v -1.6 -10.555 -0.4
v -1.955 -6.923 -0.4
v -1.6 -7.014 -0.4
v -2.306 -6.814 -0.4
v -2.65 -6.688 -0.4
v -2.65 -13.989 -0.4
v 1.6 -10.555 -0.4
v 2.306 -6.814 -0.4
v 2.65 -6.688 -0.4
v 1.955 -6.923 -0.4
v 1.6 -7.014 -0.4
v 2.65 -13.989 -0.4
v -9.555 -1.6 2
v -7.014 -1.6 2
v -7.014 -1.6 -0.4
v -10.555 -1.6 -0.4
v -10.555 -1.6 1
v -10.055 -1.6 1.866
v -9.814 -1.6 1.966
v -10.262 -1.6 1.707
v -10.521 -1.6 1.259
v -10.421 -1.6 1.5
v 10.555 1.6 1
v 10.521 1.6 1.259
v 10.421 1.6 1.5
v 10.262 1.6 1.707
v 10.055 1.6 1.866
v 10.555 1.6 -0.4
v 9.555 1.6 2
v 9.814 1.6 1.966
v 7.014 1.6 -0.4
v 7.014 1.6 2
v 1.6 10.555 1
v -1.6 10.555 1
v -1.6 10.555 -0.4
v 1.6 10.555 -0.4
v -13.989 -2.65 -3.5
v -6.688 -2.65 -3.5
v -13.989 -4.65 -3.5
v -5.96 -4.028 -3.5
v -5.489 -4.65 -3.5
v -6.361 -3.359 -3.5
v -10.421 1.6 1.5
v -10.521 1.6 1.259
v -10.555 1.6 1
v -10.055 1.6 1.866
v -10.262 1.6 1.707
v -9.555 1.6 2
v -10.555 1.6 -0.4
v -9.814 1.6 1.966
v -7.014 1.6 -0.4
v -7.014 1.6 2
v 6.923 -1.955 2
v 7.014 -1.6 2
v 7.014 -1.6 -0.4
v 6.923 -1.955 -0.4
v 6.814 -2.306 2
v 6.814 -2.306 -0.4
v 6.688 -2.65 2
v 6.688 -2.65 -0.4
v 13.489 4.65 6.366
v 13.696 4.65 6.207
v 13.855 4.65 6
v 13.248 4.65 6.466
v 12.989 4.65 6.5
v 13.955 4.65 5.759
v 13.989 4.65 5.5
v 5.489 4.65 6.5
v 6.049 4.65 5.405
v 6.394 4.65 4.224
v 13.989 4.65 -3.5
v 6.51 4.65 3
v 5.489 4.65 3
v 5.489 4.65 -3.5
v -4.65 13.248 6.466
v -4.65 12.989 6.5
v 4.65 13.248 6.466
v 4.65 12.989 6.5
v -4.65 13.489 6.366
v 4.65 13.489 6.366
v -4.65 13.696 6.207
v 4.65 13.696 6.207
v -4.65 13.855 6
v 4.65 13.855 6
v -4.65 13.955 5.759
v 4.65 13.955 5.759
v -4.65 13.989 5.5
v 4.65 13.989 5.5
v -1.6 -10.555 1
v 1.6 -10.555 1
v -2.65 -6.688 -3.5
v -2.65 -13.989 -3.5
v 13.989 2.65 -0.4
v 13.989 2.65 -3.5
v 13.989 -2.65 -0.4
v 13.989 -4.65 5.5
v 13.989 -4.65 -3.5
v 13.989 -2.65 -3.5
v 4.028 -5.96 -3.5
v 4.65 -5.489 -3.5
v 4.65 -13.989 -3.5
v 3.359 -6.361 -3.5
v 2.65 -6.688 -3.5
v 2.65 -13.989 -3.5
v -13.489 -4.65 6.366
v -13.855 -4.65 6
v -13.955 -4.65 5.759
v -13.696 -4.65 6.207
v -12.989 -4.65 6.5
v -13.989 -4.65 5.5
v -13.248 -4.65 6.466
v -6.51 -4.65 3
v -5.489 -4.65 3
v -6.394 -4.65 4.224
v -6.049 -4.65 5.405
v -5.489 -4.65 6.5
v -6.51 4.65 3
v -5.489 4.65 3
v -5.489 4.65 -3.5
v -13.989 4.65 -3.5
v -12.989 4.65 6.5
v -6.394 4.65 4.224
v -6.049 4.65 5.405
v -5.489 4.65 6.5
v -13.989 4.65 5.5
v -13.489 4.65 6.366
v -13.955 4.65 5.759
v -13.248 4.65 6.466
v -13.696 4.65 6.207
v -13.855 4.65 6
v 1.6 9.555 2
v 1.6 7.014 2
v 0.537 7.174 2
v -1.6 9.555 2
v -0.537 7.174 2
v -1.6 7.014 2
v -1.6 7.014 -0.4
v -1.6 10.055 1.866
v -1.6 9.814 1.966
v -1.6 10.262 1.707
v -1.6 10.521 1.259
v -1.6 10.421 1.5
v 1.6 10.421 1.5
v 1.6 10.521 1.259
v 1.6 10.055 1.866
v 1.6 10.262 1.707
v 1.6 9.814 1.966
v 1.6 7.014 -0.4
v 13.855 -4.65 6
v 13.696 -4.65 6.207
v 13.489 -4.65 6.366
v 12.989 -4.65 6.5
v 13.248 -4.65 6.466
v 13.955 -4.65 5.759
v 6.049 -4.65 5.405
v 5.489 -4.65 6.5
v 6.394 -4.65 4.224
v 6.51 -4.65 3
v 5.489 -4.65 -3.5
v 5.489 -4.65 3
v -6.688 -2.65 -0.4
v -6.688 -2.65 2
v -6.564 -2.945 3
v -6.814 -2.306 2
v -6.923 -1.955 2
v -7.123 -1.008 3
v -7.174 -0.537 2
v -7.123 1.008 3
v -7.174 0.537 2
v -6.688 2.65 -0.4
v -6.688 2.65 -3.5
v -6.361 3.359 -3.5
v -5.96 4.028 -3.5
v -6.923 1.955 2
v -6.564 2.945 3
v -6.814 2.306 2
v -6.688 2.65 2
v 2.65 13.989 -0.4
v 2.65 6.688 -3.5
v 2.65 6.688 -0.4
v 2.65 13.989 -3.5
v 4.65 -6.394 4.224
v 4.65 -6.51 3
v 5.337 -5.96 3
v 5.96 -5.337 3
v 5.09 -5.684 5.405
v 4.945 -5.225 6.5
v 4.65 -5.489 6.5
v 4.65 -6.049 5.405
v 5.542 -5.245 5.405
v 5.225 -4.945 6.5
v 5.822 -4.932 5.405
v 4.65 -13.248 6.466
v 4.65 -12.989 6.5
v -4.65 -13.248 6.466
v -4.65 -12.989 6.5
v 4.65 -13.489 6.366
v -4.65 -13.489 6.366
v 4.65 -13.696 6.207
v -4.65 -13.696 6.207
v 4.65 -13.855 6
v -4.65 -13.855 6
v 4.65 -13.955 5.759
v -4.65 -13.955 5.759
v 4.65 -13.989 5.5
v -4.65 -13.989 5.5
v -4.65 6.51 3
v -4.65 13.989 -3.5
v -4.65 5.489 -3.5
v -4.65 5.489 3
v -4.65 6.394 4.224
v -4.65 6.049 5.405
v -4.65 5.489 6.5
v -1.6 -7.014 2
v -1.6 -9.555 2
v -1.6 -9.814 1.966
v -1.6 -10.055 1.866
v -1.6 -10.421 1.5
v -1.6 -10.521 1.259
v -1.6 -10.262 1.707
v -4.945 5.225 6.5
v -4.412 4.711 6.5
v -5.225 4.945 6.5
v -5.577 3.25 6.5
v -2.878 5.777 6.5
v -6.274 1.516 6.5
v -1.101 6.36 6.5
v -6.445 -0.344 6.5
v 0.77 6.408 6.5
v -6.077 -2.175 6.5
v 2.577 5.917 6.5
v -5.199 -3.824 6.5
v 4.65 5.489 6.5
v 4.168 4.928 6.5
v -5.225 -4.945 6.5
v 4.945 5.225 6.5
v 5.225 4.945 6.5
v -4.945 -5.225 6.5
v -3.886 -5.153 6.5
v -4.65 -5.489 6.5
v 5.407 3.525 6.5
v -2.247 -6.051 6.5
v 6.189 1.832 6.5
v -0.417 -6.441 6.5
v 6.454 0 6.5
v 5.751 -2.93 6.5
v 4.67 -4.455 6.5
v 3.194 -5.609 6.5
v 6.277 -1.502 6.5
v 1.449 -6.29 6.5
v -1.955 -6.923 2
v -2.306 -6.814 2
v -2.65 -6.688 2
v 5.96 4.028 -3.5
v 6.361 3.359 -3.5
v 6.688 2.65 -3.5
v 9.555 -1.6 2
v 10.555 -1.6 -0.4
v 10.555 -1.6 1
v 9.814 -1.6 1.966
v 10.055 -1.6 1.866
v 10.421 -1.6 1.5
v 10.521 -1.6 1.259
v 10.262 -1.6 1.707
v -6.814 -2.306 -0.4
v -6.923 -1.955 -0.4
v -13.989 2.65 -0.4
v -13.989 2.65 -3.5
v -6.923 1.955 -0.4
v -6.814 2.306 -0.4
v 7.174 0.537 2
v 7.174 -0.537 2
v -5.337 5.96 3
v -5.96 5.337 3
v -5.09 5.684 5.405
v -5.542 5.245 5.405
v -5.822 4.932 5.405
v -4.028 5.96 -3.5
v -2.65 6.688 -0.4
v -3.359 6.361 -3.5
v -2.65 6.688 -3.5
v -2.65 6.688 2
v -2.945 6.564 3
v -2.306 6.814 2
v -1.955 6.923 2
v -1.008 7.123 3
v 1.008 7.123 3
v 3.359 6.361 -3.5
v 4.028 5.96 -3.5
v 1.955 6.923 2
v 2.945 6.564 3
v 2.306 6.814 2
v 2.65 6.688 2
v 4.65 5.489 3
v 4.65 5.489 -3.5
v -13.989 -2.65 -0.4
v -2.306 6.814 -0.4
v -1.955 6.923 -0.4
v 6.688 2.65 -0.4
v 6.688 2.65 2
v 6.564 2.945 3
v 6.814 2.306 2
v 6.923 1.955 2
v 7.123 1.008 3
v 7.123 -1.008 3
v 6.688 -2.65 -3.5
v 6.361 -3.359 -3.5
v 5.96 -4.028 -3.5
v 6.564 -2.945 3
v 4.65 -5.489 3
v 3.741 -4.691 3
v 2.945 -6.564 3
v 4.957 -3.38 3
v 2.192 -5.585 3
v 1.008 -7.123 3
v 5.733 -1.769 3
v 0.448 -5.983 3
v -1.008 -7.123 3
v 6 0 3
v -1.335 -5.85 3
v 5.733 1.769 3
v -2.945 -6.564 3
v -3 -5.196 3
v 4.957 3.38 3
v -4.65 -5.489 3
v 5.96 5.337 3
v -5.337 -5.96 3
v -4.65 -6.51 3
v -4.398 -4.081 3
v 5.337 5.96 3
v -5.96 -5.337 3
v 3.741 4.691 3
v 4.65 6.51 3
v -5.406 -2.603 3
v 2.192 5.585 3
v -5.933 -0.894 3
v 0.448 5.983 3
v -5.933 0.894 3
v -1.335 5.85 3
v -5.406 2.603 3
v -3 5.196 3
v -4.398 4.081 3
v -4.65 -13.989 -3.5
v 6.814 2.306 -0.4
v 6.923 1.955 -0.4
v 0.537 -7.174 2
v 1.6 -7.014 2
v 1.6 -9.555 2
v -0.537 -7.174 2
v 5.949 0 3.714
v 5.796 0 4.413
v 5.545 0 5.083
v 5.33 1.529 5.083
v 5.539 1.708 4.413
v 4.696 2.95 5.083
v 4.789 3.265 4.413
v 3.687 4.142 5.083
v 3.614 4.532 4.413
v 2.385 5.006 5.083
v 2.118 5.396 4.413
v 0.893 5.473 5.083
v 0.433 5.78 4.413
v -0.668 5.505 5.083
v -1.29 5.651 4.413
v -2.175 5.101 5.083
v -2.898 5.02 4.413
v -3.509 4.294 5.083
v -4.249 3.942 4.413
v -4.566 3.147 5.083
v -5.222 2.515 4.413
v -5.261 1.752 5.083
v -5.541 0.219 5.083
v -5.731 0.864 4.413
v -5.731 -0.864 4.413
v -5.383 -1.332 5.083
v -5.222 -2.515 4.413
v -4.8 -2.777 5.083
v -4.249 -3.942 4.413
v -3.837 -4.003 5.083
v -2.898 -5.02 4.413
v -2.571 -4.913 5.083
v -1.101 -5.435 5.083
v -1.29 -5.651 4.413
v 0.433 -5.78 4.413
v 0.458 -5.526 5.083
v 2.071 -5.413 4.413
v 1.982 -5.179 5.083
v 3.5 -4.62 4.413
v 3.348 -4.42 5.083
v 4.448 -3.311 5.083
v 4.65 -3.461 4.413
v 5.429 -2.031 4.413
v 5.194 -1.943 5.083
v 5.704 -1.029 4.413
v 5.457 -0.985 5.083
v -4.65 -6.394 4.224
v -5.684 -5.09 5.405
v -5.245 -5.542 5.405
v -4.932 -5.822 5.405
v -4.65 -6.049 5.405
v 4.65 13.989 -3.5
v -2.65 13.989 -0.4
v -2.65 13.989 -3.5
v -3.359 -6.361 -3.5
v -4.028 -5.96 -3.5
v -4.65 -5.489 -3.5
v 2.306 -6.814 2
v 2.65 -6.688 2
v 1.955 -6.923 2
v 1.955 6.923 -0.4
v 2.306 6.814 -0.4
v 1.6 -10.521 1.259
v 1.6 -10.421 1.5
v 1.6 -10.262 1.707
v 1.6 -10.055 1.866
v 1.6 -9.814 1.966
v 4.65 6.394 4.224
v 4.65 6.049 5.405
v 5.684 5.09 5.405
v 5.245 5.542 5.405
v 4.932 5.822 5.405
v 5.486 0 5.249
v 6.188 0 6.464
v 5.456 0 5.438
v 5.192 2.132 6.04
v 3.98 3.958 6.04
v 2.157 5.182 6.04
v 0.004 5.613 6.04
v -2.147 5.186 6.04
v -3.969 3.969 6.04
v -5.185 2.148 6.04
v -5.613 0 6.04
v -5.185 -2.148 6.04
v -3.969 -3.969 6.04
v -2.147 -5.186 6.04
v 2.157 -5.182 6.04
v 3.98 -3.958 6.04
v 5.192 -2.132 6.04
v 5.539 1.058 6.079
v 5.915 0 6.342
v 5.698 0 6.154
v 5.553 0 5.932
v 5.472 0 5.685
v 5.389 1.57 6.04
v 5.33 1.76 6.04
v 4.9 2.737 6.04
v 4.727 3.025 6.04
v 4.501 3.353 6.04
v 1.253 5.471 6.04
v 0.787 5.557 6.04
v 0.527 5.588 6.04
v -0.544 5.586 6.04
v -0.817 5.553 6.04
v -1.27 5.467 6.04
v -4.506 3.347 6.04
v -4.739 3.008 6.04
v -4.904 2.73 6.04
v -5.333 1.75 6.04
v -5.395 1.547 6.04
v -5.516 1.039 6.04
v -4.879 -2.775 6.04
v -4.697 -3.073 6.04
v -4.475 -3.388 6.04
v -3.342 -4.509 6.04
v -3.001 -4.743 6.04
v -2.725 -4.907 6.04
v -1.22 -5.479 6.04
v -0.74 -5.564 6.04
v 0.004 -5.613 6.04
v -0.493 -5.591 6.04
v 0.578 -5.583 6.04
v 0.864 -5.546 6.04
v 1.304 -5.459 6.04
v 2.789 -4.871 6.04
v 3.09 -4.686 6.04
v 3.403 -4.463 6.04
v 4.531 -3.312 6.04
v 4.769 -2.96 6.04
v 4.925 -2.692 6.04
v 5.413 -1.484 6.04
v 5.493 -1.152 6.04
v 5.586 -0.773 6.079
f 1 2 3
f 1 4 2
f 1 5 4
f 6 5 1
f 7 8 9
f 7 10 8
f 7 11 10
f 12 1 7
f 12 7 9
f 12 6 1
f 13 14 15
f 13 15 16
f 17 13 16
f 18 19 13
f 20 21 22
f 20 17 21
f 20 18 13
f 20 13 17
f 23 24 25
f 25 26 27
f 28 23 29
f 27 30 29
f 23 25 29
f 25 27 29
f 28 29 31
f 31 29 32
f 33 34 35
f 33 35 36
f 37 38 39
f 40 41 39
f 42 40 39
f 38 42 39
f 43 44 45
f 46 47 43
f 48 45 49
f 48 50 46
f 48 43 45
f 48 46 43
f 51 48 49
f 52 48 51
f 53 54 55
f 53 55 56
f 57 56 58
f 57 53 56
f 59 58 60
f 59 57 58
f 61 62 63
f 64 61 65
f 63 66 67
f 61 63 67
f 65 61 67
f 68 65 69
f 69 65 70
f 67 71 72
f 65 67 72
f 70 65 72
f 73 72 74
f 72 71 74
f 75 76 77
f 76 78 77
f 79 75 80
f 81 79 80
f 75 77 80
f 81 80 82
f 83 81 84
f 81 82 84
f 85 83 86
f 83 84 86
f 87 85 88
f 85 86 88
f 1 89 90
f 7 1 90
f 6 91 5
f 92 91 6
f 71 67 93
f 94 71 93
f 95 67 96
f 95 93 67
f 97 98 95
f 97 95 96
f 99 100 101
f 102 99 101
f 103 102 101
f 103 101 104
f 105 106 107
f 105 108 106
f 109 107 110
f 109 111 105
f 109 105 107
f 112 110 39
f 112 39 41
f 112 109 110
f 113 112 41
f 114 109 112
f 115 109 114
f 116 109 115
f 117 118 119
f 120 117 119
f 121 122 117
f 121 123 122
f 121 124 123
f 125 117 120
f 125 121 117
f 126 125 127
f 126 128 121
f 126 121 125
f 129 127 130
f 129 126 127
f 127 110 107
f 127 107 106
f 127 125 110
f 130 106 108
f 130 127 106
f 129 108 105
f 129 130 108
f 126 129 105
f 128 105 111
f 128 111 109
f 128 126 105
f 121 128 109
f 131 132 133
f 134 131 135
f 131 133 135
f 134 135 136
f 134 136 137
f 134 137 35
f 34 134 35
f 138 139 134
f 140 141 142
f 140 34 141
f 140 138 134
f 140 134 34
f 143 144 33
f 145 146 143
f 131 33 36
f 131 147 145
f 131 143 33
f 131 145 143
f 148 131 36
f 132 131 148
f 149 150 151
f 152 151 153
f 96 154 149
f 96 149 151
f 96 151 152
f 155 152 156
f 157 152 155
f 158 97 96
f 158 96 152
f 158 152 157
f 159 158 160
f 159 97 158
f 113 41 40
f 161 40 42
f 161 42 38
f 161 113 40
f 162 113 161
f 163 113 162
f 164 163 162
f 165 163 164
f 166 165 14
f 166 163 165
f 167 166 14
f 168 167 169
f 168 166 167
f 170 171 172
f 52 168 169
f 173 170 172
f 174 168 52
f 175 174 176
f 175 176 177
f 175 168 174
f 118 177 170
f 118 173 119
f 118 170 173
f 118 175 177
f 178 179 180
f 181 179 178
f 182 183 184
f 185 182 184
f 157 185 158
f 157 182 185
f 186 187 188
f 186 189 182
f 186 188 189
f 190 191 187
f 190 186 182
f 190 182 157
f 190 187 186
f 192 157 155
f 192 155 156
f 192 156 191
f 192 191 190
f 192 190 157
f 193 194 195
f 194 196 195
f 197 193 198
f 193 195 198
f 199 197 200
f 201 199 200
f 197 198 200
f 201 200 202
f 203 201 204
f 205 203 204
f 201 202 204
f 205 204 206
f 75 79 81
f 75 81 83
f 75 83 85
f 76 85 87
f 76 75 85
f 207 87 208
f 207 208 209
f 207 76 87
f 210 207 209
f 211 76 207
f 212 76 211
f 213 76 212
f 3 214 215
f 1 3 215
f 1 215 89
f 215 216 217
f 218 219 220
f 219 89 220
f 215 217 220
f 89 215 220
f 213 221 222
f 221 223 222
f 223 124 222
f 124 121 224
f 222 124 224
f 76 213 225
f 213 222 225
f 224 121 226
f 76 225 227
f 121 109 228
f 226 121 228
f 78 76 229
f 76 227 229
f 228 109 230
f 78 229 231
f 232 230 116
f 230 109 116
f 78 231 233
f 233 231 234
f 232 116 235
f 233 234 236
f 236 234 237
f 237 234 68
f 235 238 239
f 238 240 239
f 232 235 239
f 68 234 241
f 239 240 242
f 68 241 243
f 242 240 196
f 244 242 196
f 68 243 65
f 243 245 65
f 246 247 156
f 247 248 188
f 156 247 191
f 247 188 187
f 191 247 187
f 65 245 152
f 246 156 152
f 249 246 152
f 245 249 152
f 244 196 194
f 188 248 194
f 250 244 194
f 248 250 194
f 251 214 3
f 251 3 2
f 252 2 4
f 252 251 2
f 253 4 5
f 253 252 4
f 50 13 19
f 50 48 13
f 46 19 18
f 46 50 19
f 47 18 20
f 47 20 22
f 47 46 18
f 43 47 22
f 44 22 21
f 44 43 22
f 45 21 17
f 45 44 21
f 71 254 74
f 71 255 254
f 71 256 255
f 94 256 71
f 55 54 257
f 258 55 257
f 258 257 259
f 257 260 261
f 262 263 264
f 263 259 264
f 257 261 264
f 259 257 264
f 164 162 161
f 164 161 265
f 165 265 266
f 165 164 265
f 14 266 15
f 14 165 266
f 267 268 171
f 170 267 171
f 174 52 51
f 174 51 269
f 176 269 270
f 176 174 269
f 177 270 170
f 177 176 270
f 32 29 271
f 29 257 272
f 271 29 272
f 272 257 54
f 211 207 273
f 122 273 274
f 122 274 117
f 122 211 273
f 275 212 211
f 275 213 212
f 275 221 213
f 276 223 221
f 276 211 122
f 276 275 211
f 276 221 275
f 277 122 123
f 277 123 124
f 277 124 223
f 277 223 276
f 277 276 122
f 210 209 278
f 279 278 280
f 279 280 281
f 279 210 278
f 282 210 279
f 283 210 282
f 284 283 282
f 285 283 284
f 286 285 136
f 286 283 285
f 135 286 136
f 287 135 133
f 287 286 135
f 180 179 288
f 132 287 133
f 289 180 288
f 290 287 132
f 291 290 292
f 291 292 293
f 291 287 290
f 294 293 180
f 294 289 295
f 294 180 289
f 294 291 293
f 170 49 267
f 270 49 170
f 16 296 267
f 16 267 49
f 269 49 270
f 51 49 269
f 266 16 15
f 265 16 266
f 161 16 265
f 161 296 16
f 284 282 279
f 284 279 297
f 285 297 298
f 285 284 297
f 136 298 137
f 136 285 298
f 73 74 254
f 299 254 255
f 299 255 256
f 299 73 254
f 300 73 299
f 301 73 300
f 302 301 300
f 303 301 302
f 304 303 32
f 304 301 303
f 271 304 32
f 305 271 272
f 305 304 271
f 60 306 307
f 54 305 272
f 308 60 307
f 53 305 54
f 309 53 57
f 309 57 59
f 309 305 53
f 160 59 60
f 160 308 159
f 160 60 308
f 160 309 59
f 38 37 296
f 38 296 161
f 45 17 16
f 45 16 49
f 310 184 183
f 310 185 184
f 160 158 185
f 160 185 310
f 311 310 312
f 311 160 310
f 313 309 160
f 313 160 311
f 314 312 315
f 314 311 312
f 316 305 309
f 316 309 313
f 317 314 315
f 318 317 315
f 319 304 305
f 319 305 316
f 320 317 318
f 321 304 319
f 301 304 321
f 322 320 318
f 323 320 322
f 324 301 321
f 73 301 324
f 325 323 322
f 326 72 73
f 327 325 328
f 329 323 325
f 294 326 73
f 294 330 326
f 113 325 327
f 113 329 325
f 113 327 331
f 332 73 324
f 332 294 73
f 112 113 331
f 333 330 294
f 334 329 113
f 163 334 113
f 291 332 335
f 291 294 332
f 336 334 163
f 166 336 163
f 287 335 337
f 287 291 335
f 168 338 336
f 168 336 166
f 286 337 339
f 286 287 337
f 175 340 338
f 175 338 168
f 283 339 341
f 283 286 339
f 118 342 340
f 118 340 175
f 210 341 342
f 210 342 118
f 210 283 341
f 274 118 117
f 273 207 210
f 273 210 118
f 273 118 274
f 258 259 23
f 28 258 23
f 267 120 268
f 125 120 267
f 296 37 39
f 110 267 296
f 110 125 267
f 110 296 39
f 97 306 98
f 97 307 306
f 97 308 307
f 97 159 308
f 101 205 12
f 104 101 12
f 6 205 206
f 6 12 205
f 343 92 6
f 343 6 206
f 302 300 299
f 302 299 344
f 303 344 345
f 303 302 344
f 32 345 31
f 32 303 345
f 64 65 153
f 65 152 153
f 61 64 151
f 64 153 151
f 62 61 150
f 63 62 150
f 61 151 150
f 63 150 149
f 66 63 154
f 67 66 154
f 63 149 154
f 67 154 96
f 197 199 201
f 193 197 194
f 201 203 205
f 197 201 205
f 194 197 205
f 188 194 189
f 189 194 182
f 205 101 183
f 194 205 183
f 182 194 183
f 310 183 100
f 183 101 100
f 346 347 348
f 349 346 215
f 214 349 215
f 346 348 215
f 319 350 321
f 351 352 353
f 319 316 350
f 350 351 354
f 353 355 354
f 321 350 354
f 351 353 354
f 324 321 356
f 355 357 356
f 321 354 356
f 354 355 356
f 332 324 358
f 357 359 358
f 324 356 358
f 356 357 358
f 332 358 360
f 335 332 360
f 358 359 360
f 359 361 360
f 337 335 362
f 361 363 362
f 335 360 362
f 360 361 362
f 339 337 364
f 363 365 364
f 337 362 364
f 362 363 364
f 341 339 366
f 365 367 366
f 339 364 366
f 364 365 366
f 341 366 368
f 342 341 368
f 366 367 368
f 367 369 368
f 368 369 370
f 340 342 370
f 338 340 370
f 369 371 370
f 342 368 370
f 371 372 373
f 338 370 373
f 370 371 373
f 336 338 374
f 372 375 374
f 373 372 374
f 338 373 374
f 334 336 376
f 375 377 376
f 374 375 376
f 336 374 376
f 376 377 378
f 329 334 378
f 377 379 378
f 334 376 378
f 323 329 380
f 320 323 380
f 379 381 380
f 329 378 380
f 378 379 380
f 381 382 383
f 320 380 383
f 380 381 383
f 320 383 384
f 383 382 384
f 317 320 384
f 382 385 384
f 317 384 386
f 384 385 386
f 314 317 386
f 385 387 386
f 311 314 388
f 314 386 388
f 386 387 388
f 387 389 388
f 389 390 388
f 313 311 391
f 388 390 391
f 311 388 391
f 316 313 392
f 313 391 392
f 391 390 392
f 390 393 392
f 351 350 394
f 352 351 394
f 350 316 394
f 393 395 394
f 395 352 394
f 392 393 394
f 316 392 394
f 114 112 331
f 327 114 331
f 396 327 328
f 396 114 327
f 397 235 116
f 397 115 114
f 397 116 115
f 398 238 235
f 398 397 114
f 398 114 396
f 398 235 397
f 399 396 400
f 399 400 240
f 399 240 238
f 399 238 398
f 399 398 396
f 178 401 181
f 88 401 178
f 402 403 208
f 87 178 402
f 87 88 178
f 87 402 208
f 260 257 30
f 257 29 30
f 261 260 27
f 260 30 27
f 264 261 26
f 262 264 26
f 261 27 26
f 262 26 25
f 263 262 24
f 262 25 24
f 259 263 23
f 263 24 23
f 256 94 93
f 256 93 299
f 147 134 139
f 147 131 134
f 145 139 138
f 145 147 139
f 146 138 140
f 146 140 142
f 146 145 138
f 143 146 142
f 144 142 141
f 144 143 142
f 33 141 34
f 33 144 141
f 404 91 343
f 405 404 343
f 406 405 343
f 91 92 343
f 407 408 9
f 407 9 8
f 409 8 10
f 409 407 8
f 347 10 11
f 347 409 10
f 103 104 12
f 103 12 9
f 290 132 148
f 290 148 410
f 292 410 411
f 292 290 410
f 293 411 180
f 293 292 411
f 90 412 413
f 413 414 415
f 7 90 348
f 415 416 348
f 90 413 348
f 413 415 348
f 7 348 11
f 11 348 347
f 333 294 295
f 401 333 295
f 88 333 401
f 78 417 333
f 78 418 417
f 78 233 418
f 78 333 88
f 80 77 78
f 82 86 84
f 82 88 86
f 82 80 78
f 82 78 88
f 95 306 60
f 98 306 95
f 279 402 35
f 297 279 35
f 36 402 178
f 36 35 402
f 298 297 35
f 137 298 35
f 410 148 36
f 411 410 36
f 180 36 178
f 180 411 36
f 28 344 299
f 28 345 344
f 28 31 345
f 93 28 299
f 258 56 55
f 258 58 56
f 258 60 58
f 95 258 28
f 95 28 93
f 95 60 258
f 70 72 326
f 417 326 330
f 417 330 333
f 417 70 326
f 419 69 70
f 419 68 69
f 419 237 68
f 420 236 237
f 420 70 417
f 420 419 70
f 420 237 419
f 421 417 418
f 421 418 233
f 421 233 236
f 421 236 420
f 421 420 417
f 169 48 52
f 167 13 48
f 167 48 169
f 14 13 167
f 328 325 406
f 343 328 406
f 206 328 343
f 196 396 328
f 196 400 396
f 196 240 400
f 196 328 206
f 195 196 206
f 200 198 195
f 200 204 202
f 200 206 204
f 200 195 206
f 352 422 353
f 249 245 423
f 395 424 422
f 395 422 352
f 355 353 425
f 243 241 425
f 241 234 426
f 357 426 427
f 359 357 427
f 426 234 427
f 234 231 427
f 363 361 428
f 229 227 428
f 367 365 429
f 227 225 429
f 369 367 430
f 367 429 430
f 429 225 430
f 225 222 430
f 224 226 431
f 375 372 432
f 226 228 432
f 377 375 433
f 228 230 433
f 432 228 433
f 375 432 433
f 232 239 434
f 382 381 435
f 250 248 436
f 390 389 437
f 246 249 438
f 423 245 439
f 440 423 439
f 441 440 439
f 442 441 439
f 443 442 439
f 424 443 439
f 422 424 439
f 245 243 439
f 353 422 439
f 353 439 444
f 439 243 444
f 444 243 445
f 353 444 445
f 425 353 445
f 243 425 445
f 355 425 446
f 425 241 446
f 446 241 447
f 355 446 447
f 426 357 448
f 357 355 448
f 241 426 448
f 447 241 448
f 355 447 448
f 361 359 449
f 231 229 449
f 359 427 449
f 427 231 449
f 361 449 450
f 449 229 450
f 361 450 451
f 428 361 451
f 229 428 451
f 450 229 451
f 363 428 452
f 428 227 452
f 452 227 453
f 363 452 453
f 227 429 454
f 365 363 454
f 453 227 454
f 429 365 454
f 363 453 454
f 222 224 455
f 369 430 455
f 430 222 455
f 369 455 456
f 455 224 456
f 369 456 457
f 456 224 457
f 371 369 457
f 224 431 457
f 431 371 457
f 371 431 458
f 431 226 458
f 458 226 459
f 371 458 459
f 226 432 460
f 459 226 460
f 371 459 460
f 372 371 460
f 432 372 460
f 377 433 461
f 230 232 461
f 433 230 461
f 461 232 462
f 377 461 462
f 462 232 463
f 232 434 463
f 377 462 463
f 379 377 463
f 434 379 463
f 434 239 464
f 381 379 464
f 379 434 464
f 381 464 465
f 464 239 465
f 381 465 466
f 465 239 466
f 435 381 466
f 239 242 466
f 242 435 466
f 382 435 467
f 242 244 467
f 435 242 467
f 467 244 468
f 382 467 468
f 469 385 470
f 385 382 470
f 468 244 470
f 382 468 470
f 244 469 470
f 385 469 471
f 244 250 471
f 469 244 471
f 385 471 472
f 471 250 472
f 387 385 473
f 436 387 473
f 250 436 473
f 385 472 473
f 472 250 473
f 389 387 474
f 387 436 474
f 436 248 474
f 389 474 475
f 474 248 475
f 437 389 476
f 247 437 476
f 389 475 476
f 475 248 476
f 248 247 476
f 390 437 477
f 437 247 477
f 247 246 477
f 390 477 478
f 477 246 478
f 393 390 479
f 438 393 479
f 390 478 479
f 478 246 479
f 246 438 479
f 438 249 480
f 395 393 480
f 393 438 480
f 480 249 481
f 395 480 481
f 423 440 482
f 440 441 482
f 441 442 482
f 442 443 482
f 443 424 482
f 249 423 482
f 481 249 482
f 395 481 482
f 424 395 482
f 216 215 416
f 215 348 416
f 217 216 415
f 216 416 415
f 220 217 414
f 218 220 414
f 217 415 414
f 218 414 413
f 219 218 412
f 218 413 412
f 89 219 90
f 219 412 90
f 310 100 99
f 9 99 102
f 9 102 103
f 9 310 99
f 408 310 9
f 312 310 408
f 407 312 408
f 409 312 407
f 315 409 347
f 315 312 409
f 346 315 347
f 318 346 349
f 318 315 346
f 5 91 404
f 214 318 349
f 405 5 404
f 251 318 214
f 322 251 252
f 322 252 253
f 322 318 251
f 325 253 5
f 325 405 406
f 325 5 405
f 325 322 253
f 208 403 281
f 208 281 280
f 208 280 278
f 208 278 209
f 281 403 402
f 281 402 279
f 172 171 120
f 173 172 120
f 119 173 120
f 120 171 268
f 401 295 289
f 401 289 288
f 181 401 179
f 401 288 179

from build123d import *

# Parameters (mm, degrees)
PAD001_DEPTH    = 6.5
POCKET003_DEPTH = 5.5
PAD002_DEPTH    = 3.5
FILLET007_R     = 1
PAD009_DEPTH    = 2.4
FILLET_R        = 1
FILLET009_R     = 1
SKETCH025_W     = 5.3
SKETCH025_H     = 2
SKETCH025_W_2   = 2
SKETCH025_H_2   = 5.3
POCKET005_DEPTH = 3.1


with BuildPart() as part:
    # Sketch003 → Revolution001 (revolve)
    with BuildSketch(Plane.XZ):
        with BuildLine():
            Line((6, 3), (8, 3))
            ThreePointArc((8, 3), (7.795832, 4.795832), (7.193747, 6.5))
            Line((7.193747, 6.5), (4.570714, 6.5))
            ThreePointArc((6, 3), (5.628908, 4.890295), (4.570714, 6.5))
        make_face()
    revolve(axis=Axis((0, 0, 0), (0, 0, 1)))

    # Sketch004 (on Face1 of Revolution001) → Pad001 (new body)
    with BuildSketch(Plane(origin=(0, 0, 3), x_dir=(1, 0, 0), z_dir=(0, 0, -1))):
        with BuildLine():
            Line((4.65, -5.488852), (4.65, -13.988852))
            Line((4.65, -13.988852), (-4.65, -13.988852))
            Line((-4.65, -13.988852), (-4.65, -5.488852))
            ThreePointArc((-4.65, -5.488852), (0, -7.193747), (4.65, -5.488852))
        make_face()
        with BuildLine():
            Line((-5.488852, -4.65), (-13.988852, -4.65))
            Line((-13.988852, -4.65), (-13.988852, 4.65))
            Line((-13.988852, 4.65), (-5.488852, 4.65))
            ThreePointArc((-5.488852, 4.65), (-7.193747, 0), (-5.488852, -4.65))
        make_face()
        with BuildLine():
            Line((13.988852, -4.65), (13.988852, 4.65))
            Line((5.488852, 4.65), (13.988852, 4.65))
            ThreePointArc((5.488852, -4.65), (7.193747, 0), (5.488852, 4.65))
            Line((5.488852, -4.65), (13.988852, -4.65))
        make_face()
        with BuildLine():
            Line((-4.65, 5.488852), (-4.65, 13.988852))
            Line((-4.65, 13.988852), (4.65, 13.988852))
            Line((4.65, 13.988852), (4.65, 5.488852))
            ThreePointArc((4.65, 5.488852), (0, 7.193747), (-4.65, 5.488852))
        make_face()
    extrude(amount=PAD001_DEPTH)

    # Sketch018 (on Face24 of Pad001) → Pocket003 (cut)
    with BuildSketch(Plane(origin=(0, 0, -3.5), x_dir=(1, 0, 0), z_dir=(0, 0, -1))):
        with BuildLine():
            Line((-6.687862, 2.65), (-11.988852, 2.65))
            Line((-11.988852, 2.65), (-11.988852, -2.65))
            Line((-11.988852, -2.65), (-6.687862, -2.65))
            ThreePointArc((-6.687862, 2.65), (-7.193747, 0), (-6.687862, -2.65))
        make_face()
        with BuildLine():
            Line((-2.65, 6.687862), (-2.65, 11.988852))
            Line((-2.65, 11.988852), (2.65, 11.988852))
            Line((2.65, 11.988852), (2.65, 6.687862))
            ThreePointArc((2.65, 6.687862), (0, 7.193747), (-2.65, 6.687862))
        make_face()
        with BuildLine():
            Line((6.687862, 2.65), (11.988852, 2.65))
            Line((11.988852, 2.65), (11.988852, -2.65))
            Line((11.988852, -2.65), (6.687862, -2.65))
            ThreePointArc((6.687862, -2.65), (7.193747, 0), (6.687862, 2.65))
        make_face()
        with BuildLine():
            Line((2.65, -6.687862), (2.65, -11.988852))
            Line((2.65, -11.988852), (-2.65, -11.988852))
            Line((-2.65, -11.988852), (-2.65, -6.687862))
            ThreePointArc((-2.65, -6.687862), (0, -7.193747), (2.65, -6.687862))
        make_face()
    extrude(amount=-POCKET003_DEPTH, mode=Mode.SUBTRACT)

    # Sketch006 (on Face19 of Pocket003) → Pad002 (join)
    with BuildSketch(Plane(origin=(0, 0, 3), x_dir=(-1, 0, 0), z_dir=(0, 0, 1))):
        with BuildLine():
            Line((-13.988852, 4.65), (-5.488852, 4.65))
            ThreePointArc((-5.488852, 4.65), (-7.193747, 0), (-5.488852, -4.65))
            Line((-13.988852, -4.65), (-5.488852, -4.65))
            Line((-13.988852, -4.65), (-13.988852, 4.65))
        make_face()
        with BuildLine():
            Line((-4.65, 13.988852), (-4.65, 5.488852))
            ThreePointArc((4.65, 5.488852), (0, 7.193747), (-4.65, 5.488852))
            Line((4.65, 13.988852), (4.65, 5.488852))
            Line((-4.65, 13.988852), (4.65, 13.988852))
        make_face()
        with BuildLine():
            Line((5.488852, 4.65), (13.988852, 4.65))
            Line((13.988852, 4.65), (13.988852, -4.65))
            Line((13.988852, -4.65), (5.488852, -4.65))
            ThreePointArc((5.488852, -4.65), (7.193747, 0), (5.488852, 4.65))
        make_face()
        with BuildLine():
            Line((4.65, -5.488852), (4.65, -13.988852))
            Line((4.65, -13.988852), (-4.65, -13.988852))
            Line((-4.65, -13.988852), (-4.65, -5.488852))
            ThreePointArc((-4.65, -5.488852), (0, -7.193747), (4.65, -5.488852))
        make_face()
    extrude(amount=PAD002_DEPTH)

    # Fillet007
    fillet007_edges = [part.edges().sort_by_distance(p)[0] for p in [
        (-4.570714, 0, 6.5),
    ]]
    fillet(fillet007_edges, radius=FILLET007_R)

    # Sketch019 (on Face32 of Pad002) → Pad009 (join)
    with BuildSketch(Plane(origin=(0, 0, 2), x_dir=(1, 0, 0), z_dir=(0, 0, -1))):
        with BuildLine():
            Line((-11.988852, 2.65), (-6.687862, 2.65))
            ThreePointArc((-6.687862, 2.65), (-6.870797, 2.131231), (-7.013558, 1.6))
            Line((-7.013558, 1.6), (-10.555, 1.6))
            Line((-10.555, 1.6), (-10.555, -1.6))
            Line((-10.555, -1.6), (-7.013558, -1.6))
            ThreePointArc((-7.013558, -1.6), (-6.870797, -2.131231), (-6.687862, -2.65))
            Line((-11.988852, -2.65), (-6.687862, -2.65))
            Line((-11.988852, 2.65), (-11.988852, -2.65))
        make_face()
        with BuildLine():
            Line((-2.65, 6.687862), (-2.65, 11.988852))
            Line((-2.65, 11.988852), (2.65, 11.988852))
            Line((2.65, 11.988852), (2.65, 6.687862))
            ThreePointArc((2.65, 6.687862), (2.131231, 6.870797), (1.6, 7.013558))
            Line((1.6, 10.555), (1.6, 7.013558))
            Line((-1.6, 10.555), (1.6, 10.555))
            Line((-1.6, 7.013558), (-1.6, 10.555))
            ThreePointArc((-1.6, 7.013558), (-2.131231, 6.870797), (-2.65, 6.687862))
        make_face()
        with BuildLine():
            Line((6.687862, 2.65), (11.988852, 2.65))
            Line((11.988852, 2.65), (11.988852, -2.65))
            Line((11.988852, -2.65), (6.687862, -2.65))
            ThreePointArc((6.687862, -2.65), (6.870797, -2.131231), (7.013558, -1.6))
            Line((10.555, -1.6), (7.013558, -1.6))
            Line((10.555, 1.6), (10.555, -1.6))
            Line((7.013558, 1.6), (10.555, 1.6))
            ThreePointArc((7.013558, 1.6), (6.870797, 2.131231), (6.687862, 2.65))
        make_face()
        with BuildLine():
            Line((2.65, -11.988852), (-2.65, -11.988852))
            Line((-2.65, -11.988852), (-2.65, -6.687862))
            ThreePointArc((-2.65, -6.687862), (-2.131231, -6.870797), (-1.6, -7.013558))
            Line((-1.6, -7.013558), (-1.6, -10.555))
            Line((-1.6, -10.555), (1.6, -10.555))
            Line((1.6, -10.555), (1.6, -7.013558))
            ThreePointArc((1.6, -7.013558), (2.131231, -6.870797), (2.65, -6.687862))
            Line((2.65, -6.687862), (2.65, -11.988852))
        make_face()
    extrude(amount=PAD009_DEPTH)

    # Fillet
    fillet_edges = [part.edges().sort_by_distance(p)[0] for p in [
        (10.555, 0, 2),
        (0, -10.555, 2),
        (-10.555, 0, 2),
        (0, 10.555, 2),
    ]]
    fillet(fillet_edges, radius=FILLET_R)

    # Fillet009
    fillet009_edges = [part.edges().sort_by_distance(p)[0] for p in [
        (13.988852, 0, 6.5),
        (0, 13.988852, 6.5),
        (-13.988852, 0, 6.5),
        (0, -13.988852, 6.5),
    ]]
    fillet(fillet009_edges, radius=FILLET009_R)

    # Sketch025 (on Face48 of Fillet009) → Pocket005 (cut)
    with BuildSketch(Plane(origin=(0, 0, -3.5), x_dir=(1, 0, 0), z_dir=(0, 0, -1))):
        with Locations((0, -12.988852)):
            Rectangle(SKETCH025_W, SKETCH025_H)
        with Locations((12.988852, 0)):
            Rectangle(SKETCH025_W_2, SKETCH025_H_2)
        with Locations((0, 12.988852)):
            Rectangle(SKETCH025_W, SKETCH025_H)
        with Locations((-12.988852, 0)):
            Rectangle(SKETCH025_W_2, SKETCH025_H_2)
    extrude(amount=-POCKET005_DEPTH, mode=Mode.SUBTRACT)


solid = part.part
